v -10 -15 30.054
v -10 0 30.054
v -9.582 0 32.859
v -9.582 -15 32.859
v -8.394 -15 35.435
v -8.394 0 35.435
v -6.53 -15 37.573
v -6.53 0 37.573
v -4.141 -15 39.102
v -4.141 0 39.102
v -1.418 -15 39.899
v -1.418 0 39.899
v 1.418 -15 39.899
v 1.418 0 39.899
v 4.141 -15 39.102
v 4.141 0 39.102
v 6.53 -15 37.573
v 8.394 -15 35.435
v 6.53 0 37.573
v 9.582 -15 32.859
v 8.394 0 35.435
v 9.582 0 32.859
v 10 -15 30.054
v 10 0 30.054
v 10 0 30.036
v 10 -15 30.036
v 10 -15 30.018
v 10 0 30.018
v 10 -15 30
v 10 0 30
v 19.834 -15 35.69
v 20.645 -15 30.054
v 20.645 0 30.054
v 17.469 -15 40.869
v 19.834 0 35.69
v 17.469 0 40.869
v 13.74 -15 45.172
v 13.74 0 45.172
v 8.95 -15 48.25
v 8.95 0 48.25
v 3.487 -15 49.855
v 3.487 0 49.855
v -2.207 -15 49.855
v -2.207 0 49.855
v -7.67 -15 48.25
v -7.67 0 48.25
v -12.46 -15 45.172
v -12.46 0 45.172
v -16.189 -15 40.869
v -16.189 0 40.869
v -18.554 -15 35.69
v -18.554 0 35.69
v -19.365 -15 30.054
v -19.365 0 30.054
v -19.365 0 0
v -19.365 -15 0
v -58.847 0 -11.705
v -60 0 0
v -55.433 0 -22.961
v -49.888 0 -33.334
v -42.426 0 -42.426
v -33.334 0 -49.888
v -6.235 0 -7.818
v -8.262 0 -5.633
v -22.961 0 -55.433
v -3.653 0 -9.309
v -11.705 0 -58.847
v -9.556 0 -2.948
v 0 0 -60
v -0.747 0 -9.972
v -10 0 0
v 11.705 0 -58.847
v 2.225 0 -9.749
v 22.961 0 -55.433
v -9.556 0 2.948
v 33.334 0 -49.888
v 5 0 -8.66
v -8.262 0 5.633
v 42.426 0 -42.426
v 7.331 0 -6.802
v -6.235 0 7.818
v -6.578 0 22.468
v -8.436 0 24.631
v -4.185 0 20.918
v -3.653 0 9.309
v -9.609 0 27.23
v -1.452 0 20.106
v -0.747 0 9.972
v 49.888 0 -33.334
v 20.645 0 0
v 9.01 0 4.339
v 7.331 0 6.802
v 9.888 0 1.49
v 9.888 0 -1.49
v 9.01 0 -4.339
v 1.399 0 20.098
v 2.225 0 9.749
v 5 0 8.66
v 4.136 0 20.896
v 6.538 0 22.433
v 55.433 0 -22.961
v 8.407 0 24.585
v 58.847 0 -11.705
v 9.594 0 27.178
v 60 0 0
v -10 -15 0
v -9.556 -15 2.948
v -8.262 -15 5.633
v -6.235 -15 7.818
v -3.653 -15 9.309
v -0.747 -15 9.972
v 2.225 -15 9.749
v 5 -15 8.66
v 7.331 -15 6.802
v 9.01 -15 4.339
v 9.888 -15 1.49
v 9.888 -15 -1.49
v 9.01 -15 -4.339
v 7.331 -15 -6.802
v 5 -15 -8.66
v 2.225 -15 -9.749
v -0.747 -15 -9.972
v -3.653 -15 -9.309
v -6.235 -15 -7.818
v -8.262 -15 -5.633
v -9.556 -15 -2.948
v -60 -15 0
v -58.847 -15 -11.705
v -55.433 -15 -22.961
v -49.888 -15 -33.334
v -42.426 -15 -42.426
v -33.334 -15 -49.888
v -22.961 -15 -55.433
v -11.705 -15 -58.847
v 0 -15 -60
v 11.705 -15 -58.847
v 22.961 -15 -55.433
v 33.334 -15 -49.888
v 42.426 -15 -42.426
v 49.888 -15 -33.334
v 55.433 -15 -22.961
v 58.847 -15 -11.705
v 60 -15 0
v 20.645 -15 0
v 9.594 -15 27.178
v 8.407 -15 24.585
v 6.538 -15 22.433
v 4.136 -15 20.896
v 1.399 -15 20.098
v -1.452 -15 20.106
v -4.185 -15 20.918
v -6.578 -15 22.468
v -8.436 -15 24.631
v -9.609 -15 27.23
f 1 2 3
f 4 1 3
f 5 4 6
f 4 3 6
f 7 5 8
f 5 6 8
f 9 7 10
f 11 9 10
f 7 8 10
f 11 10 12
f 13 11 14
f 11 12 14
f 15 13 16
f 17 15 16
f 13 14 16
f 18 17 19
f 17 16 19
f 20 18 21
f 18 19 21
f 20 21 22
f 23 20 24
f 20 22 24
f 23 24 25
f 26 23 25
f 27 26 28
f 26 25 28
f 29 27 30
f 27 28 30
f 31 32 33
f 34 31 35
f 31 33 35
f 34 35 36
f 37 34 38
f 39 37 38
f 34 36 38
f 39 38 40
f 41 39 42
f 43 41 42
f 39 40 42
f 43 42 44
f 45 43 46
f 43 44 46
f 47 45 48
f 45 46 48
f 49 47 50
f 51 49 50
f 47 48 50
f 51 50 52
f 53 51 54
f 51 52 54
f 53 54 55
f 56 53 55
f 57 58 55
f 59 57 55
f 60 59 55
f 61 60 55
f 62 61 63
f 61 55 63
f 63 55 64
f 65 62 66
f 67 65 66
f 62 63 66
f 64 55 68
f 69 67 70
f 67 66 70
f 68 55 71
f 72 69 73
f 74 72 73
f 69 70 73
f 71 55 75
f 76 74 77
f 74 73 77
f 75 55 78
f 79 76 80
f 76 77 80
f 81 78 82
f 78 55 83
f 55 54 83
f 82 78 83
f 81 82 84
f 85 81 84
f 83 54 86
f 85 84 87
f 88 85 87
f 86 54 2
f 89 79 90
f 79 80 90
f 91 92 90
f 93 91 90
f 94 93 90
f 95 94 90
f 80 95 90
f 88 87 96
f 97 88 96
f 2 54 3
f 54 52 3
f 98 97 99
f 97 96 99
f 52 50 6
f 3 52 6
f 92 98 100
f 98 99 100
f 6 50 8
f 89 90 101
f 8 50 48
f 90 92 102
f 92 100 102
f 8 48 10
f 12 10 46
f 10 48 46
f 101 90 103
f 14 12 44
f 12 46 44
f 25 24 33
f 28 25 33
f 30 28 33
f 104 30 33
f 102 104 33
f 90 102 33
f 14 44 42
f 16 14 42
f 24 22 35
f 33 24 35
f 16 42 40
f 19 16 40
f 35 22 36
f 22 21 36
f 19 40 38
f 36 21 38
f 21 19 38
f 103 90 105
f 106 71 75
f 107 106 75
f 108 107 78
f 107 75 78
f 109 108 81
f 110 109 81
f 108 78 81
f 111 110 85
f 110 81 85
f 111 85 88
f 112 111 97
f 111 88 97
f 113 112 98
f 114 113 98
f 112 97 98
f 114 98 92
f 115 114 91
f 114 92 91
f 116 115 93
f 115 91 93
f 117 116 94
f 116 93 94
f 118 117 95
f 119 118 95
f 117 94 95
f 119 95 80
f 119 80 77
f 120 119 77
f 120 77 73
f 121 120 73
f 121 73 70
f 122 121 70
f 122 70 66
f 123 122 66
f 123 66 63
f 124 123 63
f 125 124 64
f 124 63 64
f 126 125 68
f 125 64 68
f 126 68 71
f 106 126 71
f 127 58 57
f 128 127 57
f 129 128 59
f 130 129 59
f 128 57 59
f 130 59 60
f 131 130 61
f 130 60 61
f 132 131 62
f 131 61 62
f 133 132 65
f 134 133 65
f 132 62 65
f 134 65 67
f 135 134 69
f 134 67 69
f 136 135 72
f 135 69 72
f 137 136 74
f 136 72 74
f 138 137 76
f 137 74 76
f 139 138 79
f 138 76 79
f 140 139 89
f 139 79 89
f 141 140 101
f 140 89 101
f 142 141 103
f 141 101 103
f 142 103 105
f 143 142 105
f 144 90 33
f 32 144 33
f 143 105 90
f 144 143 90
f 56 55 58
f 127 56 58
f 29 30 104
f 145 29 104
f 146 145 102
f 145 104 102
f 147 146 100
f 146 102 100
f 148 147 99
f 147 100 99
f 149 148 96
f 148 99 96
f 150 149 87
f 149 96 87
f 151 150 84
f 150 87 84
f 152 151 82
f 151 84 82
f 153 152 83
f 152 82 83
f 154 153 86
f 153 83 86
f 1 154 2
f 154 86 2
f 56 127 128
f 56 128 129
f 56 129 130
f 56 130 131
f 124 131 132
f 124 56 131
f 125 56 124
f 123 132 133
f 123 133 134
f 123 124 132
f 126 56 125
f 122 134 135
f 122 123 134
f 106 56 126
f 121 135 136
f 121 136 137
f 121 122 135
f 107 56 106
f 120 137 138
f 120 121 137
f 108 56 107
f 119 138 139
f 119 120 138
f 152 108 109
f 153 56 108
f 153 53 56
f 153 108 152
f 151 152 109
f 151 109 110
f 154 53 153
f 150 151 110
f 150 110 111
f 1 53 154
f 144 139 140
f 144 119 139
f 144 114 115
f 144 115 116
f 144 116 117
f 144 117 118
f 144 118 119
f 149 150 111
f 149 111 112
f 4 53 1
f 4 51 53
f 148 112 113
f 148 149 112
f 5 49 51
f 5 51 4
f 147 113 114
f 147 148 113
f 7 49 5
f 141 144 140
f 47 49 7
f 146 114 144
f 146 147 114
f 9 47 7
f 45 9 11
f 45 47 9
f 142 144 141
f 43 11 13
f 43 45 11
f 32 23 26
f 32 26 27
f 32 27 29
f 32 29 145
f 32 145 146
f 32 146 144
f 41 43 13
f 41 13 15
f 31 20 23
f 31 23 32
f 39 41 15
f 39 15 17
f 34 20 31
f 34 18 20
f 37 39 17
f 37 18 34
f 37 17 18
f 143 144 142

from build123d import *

# Parameters (mm, degrees)
F1_DEPTH = 15


with BuildPart() as f1:
    # F0 (on Front) → F1 (new body)
    with BuildSketch(Plane.XZ):
        with BuildLine():
            Line((-19.364525, 0), (-60, 0))
            ThreePointArc((-60, 0), (0, -60), (60, 0))
            Line((60, 0), (20.64457, 0))
            Line((20.64457, 0), (10, 0))
            ThreePointArc((10, 0), (0, -10), (-10, 0))
            Line((-10, 0), (-19.364525, 0))
        make_face()
        with BuildLine():
            Line((-19.364525, 30.053675), (-19.364525, 0))
            Line((-19.364525, 0), (-10, 0))
            ThreePointArc((-10, 0), (0, 10), (10, 0))
            Line((10, 0), (20.64457, 0))
            Line((20.64457, 0), (20.64457, 30.053675))
            Line((20.64457, 30.053675), (9.999856, 30.053675))
            ThreePointArc((9.999856, 30.053675), (9.999964, 30.026838), (10, 30))
            ThreePointArc((10, 30), (-0.026838, 20.000036), (-9.999856, 30.053675))
            Line((-9.999856, 30.053675), (-19.364525, 30.053675))
        make_face()
        with BuildLine():
            ThreePointArc((20.64457, 30.053675), (0.640023, 50.058223), (-19.364525, 30.053675))
            Line((-19.364525, 30.053675), (-9.999856, 30.053675))
            ThreePointArc((-9.999856, 30.053675), (0, 40), (9.999856, 30.053675))
            Line((9.999856, 30.053675), (20.64457, 30.053675))
        make_face()
    extrude(amount=F1_DEPTH)


solid = f1.part
